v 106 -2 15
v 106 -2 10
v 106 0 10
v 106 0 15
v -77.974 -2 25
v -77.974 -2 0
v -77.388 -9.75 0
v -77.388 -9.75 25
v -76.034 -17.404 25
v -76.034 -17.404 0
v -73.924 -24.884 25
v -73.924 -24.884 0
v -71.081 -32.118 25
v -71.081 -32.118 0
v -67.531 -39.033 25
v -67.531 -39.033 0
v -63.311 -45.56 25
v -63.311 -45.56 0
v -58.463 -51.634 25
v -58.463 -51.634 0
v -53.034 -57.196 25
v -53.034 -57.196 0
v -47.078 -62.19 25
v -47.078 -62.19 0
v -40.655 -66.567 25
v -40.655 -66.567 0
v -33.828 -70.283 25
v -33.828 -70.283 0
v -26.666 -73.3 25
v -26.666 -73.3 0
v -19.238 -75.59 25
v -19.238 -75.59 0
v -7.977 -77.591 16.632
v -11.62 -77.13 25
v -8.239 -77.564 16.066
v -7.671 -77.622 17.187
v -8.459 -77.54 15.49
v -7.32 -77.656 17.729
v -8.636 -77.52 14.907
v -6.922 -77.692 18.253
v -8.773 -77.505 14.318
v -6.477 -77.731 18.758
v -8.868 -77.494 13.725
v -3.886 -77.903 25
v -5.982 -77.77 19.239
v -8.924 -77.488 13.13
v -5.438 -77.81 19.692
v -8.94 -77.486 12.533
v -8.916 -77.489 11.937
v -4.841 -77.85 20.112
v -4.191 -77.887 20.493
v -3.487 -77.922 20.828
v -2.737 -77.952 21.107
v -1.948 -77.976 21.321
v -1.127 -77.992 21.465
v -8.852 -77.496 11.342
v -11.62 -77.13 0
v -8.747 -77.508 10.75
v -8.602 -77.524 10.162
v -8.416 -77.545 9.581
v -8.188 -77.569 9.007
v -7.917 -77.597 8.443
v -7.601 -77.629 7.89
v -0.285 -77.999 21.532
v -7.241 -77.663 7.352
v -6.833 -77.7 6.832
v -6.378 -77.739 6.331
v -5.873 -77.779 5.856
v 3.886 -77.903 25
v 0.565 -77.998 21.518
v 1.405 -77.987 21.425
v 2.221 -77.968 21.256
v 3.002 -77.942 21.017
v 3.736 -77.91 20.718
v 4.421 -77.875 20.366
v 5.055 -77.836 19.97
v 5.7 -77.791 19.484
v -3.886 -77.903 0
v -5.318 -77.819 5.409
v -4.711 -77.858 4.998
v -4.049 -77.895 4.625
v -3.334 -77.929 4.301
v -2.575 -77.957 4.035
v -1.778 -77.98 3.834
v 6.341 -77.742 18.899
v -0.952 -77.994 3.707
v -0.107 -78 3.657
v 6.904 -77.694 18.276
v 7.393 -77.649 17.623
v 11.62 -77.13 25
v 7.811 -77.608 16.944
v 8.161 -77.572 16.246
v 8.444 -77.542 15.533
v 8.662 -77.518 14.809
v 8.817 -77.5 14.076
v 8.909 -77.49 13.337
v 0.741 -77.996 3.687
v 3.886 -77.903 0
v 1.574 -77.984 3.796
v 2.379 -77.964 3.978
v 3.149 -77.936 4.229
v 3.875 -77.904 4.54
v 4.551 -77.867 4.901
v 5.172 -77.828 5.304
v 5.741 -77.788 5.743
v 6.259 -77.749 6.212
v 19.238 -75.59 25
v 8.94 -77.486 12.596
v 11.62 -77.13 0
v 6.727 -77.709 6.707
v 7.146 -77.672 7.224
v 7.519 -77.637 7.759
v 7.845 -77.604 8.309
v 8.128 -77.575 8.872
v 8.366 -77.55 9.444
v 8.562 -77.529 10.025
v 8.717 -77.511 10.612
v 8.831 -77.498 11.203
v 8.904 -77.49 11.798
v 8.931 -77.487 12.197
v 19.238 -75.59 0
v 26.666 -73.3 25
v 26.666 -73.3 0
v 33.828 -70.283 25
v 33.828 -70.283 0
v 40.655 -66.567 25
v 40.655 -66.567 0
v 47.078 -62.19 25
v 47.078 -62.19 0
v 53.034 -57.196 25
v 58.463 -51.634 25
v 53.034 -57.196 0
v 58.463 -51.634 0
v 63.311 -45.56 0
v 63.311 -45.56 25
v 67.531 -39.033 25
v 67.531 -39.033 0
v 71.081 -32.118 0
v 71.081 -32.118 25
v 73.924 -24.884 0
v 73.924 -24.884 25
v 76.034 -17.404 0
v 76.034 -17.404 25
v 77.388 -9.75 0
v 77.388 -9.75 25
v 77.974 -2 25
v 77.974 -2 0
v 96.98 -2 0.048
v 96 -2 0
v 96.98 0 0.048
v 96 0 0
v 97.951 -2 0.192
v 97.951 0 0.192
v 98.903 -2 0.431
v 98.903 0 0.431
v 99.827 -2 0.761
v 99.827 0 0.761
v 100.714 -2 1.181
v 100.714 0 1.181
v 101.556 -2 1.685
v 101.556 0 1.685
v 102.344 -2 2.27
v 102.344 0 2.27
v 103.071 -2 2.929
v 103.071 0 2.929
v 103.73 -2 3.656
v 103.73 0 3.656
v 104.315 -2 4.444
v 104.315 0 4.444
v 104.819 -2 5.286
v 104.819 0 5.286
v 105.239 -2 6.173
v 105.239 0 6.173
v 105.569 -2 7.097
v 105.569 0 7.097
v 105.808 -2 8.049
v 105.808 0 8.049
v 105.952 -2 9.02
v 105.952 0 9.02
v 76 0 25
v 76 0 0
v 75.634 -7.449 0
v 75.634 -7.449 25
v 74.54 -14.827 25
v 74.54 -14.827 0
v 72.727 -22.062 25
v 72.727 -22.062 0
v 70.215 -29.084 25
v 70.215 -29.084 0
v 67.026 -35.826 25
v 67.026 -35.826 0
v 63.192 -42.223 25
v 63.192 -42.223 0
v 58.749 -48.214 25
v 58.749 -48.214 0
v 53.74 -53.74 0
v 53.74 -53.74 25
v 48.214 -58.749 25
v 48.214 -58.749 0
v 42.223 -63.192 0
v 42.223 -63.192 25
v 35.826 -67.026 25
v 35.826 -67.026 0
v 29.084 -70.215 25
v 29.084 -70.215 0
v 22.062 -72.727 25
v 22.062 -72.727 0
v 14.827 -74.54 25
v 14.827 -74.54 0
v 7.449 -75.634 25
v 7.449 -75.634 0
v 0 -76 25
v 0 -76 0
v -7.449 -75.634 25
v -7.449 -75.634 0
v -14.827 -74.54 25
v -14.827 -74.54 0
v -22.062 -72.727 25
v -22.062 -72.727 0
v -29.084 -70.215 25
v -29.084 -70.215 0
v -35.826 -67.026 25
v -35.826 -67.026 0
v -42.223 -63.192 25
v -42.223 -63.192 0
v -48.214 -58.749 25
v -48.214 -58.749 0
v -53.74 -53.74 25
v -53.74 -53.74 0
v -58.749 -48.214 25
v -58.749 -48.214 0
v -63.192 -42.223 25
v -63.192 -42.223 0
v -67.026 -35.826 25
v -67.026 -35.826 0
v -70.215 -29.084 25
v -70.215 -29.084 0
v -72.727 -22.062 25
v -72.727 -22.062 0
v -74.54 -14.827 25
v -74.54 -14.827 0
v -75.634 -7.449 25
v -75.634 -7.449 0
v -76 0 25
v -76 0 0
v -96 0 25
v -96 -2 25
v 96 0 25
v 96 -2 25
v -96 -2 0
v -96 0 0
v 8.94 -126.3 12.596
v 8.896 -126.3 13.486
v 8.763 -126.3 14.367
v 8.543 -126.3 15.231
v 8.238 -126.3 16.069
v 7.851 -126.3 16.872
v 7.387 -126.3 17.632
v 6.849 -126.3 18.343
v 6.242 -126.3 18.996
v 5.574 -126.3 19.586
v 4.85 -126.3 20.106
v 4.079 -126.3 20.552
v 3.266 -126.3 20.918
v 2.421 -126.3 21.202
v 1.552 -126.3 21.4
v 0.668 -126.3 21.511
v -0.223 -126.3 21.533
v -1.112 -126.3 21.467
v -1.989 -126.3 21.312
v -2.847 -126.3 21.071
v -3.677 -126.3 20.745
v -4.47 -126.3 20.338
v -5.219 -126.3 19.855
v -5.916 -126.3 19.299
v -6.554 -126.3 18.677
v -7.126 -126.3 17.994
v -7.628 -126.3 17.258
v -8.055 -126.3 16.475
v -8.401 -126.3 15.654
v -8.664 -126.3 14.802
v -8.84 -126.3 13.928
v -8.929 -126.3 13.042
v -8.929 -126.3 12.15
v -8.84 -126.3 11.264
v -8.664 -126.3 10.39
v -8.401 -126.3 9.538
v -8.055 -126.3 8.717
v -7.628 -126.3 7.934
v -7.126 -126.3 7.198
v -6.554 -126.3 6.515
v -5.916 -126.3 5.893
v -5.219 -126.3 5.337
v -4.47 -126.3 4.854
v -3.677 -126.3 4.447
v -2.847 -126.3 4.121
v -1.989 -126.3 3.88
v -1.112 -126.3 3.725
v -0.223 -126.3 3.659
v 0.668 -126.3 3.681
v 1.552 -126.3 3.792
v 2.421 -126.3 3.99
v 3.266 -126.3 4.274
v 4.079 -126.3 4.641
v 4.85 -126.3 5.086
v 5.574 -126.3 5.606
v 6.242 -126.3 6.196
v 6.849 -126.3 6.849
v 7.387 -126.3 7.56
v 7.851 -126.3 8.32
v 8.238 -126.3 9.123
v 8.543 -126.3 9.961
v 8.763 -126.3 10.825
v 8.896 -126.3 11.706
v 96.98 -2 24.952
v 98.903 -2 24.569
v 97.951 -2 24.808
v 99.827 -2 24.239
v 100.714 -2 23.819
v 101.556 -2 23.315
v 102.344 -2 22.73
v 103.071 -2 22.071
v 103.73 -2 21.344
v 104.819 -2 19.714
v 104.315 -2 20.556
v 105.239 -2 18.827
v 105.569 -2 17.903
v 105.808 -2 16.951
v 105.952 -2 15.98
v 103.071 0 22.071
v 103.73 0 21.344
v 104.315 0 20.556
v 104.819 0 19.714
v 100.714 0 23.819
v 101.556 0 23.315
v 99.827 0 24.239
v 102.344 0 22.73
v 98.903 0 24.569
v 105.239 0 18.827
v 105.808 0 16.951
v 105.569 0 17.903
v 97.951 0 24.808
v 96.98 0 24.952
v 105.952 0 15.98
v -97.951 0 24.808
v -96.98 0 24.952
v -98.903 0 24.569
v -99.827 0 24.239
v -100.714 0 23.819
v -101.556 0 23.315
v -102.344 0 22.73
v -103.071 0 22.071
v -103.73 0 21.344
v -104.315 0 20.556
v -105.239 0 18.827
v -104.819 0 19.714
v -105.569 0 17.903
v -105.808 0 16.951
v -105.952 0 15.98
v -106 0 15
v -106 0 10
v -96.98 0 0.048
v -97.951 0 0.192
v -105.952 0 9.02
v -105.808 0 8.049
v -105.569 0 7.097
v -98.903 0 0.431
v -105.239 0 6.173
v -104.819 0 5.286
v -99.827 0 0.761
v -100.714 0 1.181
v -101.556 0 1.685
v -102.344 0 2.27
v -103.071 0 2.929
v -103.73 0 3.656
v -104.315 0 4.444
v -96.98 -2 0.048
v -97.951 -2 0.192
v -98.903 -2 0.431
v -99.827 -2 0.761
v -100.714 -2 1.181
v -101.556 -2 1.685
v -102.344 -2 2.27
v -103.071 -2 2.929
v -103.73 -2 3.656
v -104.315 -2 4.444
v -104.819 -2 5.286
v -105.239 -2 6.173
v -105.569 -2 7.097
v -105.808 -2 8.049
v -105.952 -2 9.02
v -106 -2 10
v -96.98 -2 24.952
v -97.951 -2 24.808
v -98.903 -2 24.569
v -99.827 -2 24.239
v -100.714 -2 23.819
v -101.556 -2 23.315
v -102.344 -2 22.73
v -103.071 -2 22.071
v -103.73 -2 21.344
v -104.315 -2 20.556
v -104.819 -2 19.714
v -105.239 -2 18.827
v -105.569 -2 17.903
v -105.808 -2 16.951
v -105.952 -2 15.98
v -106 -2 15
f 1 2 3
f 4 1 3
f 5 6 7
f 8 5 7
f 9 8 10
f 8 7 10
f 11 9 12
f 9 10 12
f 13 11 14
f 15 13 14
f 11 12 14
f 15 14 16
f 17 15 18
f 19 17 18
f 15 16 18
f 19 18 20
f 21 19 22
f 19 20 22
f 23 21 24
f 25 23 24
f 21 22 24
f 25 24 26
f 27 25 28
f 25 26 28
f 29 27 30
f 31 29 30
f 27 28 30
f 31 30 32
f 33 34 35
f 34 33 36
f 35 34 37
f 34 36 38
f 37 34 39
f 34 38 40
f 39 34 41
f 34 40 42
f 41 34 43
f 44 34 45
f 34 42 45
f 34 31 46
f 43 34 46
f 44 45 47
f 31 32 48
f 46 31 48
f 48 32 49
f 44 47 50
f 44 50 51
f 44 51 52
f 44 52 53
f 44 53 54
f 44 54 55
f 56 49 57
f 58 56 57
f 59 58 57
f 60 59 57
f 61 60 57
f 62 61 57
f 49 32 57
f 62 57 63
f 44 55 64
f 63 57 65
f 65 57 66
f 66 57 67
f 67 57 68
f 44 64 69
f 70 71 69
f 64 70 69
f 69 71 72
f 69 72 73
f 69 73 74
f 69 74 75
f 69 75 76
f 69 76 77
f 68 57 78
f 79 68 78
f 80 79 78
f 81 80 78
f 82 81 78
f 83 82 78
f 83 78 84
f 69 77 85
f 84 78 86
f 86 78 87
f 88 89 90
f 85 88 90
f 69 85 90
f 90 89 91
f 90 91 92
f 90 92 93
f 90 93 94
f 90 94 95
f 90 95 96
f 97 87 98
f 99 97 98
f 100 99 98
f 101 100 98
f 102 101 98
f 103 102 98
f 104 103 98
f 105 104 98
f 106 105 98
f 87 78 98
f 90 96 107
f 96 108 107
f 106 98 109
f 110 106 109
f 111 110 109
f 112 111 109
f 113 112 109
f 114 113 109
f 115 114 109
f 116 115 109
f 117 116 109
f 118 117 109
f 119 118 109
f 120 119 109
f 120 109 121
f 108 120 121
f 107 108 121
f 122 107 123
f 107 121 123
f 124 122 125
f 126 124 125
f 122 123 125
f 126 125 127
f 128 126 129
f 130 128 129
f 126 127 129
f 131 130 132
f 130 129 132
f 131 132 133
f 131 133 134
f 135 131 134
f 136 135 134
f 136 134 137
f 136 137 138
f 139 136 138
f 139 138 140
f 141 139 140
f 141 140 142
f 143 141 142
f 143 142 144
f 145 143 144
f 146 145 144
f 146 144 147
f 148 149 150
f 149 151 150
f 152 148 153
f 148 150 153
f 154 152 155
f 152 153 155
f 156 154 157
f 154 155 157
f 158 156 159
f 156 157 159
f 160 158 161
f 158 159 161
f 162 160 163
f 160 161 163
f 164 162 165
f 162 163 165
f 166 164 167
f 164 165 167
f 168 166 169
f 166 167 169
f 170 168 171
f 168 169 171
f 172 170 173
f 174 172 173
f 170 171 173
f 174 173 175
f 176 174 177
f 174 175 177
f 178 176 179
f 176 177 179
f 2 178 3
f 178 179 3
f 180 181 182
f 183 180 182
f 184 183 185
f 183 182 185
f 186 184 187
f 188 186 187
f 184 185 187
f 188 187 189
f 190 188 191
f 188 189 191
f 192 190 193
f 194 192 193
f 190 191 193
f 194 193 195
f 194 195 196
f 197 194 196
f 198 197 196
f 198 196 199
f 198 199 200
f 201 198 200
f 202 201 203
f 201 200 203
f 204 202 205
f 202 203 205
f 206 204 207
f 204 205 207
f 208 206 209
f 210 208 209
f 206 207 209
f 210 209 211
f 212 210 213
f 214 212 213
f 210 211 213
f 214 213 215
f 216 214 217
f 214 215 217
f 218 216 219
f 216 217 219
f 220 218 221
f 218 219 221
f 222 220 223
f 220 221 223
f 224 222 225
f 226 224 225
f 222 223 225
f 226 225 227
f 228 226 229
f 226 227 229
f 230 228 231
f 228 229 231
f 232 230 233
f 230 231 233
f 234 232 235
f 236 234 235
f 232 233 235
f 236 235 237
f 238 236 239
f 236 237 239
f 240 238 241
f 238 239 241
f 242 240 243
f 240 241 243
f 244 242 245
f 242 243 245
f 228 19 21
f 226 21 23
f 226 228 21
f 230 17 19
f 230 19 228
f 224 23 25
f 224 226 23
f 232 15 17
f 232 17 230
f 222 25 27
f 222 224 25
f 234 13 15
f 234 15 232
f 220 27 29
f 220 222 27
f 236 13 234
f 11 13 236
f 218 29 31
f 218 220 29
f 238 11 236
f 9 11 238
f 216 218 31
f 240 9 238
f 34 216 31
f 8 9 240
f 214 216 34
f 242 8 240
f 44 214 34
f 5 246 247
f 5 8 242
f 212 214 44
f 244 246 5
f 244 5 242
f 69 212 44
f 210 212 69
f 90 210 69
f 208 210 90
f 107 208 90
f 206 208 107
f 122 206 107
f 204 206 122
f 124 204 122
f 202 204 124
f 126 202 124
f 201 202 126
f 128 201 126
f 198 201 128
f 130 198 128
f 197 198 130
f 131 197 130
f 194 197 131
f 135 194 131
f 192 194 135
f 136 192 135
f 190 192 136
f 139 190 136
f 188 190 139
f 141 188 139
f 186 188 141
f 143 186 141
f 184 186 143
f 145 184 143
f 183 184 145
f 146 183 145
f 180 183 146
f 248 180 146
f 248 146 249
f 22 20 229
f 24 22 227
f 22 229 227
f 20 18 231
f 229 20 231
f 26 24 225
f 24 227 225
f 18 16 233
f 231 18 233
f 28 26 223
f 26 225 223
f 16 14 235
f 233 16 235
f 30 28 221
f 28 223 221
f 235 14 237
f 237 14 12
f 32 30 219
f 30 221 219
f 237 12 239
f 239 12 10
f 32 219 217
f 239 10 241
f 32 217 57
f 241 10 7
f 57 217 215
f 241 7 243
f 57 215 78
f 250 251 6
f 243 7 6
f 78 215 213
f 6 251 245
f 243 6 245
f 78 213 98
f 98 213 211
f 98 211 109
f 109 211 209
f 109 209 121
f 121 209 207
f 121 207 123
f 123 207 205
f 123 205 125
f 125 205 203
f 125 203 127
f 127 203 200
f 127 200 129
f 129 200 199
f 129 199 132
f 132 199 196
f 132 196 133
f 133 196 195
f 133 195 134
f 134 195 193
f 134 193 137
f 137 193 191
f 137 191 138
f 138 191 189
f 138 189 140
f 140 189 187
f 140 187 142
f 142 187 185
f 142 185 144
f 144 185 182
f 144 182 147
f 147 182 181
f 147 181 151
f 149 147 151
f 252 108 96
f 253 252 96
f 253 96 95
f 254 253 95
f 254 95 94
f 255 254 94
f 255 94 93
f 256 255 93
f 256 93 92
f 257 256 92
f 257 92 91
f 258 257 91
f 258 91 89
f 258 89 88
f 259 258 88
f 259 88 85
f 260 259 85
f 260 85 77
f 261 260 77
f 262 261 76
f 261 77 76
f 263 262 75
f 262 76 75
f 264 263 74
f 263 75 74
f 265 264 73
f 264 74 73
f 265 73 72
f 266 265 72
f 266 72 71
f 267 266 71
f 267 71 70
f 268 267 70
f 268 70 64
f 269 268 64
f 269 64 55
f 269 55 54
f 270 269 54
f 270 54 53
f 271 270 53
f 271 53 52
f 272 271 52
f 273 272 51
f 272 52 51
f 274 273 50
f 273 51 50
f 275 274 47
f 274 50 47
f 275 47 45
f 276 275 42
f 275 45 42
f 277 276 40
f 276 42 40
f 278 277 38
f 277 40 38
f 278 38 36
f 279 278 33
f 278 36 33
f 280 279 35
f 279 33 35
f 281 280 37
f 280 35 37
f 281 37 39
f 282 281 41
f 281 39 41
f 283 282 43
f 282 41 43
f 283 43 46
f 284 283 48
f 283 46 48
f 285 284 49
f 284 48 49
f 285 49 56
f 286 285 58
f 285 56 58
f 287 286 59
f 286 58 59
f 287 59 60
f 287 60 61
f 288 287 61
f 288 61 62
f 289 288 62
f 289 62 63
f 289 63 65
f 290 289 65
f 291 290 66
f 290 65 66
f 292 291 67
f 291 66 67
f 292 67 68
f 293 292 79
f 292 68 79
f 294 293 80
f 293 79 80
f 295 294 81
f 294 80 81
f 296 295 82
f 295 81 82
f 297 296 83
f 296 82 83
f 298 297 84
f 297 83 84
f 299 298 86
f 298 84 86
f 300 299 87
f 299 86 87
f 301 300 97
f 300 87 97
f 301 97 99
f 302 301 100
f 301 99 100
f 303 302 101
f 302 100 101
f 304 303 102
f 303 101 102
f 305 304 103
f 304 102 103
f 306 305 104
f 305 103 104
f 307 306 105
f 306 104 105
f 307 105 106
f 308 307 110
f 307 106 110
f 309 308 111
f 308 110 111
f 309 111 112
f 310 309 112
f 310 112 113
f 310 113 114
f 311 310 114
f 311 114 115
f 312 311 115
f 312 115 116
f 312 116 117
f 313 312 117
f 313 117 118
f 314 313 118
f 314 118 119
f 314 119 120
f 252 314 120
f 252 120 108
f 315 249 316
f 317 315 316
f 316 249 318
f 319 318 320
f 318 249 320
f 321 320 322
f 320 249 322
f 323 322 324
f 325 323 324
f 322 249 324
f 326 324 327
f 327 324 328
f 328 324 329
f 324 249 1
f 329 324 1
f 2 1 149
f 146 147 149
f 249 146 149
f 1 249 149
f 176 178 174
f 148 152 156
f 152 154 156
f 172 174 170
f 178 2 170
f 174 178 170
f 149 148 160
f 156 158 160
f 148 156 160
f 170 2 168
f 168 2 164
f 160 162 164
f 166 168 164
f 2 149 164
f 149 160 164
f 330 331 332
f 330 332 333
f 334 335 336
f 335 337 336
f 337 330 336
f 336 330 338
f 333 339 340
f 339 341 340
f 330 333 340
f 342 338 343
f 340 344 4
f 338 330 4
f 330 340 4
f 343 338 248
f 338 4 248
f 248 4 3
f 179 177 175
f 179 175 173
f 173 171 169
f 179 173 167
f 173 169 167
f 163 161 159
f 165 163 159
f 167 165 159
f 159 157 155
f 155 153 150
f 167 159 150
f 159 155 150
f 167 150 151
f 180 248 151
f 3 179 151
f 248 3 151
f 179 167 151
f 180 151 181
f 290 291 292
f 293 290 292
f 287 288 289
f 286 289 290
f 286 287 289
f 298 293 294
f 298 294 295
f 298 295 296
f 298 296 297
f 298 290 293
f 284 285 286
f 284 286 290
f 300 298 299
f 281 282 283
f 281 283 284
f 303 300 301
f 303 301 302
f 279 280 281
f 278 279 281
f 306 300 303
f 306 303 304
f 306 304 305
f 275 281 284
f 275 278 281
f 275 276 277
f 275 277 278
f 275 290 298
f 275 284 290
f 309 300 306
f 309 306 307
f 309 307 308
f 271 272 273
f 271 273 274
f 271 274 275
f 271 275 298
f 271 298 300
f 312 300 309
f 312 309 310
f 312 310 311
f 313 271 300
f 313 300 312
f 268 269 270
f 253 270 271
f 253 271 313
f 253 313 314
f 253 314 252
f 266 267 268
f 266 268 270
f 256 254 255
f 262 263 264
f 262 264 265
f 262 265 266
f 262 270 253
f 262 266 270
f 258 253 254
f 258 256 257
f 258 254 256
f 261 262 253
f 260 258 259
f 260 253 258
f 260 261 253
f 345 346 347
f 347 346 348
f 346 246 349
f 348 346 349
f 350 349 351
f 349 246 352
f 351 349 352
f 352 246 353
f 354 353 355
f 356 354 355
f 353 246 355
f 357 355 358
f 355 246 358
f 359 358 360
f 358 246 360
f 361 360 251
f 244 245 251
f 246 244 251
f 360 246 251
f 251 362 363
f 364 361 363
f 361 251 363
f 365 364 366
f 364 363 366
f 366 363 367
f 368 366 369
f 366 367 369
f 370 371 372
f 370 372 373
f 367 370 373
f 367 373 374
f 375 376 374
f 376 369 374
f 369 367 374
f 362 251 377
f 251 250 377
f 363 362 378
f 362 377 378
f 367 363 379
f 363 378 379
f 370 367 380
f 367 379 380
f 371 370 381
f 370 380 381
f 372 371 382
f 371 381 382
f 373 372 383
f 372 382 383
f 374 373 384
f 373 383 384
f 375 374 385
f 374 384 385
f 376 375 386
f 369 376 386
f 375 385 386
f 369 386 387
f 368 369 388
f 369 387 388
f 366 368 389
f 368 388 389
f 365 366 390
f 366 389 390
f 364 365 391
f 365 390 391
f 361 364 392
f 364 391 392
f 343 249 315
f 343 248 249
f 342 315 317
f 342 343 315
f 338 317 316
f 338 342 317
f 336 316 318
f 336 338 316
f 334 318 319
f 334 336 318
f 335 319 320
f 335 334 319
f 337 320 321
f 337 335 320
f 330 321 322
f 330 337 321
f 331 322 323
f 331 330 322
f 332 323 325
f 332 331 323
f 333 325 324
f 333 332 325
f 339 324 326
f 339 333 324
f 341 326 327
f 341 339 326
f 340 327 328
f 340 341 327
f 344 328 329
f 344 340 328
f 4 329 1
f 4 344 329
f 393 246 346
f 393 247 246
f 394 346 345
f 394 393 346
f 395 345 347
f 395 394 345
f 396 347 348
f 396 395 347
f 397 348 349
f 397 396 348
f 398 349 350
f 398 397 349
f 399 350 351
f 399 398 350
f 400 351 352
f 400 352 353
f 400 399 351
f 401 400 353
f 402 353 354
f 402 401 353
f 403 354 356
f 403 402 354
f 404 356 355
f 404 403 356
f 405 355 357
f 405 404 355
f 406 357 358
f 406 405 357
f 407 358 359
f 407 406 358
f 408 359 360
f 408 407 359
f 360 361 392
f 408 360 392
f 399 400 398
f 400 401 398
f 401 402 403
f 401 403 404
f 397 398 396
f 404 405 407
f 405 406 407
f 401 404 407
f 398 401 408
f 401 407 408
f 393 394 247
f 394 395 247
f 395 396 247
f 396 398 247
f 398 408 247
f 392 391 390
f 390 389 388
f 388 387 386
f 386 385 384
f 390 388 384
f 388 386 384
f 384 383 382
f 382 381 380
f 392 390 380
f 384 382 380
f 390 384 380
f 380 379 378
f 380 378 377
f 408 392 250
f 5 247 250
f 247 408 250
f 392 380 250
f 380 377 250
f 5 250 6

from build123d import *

# Parameters (mm, degrees)
F1_DEPTH = 25
F3_R     = 8.940087
F4_DEPTH = 50
F5_R     = 10


with BuildPart() as f1:
    # F0 (on Top) → F1 (new body)
    with BuildSketch(Plane.XY):
        with BuildLine():
            ThreePointArc((76, 0), (0, -76), (-76, 0))
            Line((-76, 0), (-106, 0))
            Line((-106, 0), (-106, -2))
            Line((-106, -2), (-77.974355, -2))
            ThreePointArc((-77.974355, -2), (0, -78), (77.974355, -2))
            Line((77.974355, -2), (106, -2))
            Line((106, -2), (106, 0))
            Line((106, 0), (76, 0))
        make_face()
    extrude(amount=F1_DEPTH)

    # F3 (on offset) → F4 (join)
    with BuildSketch(Plane.XZ.offset(76.3)):
        with Locations((0, 12.596033)):
            Circle(F3_R)
    extrude(amount=F4_DEPTH)

    # F5
    f5_edges = [f1.edges().sort_by_distance(p)[0] for p in [
        (106, -1, 25),
        (106, -1, 0),
        (-106, -1, 25),
        (-106, -1, 0),
    ]]
    fillet(f5_edges, radius=F5_R)


solid = f1.part
